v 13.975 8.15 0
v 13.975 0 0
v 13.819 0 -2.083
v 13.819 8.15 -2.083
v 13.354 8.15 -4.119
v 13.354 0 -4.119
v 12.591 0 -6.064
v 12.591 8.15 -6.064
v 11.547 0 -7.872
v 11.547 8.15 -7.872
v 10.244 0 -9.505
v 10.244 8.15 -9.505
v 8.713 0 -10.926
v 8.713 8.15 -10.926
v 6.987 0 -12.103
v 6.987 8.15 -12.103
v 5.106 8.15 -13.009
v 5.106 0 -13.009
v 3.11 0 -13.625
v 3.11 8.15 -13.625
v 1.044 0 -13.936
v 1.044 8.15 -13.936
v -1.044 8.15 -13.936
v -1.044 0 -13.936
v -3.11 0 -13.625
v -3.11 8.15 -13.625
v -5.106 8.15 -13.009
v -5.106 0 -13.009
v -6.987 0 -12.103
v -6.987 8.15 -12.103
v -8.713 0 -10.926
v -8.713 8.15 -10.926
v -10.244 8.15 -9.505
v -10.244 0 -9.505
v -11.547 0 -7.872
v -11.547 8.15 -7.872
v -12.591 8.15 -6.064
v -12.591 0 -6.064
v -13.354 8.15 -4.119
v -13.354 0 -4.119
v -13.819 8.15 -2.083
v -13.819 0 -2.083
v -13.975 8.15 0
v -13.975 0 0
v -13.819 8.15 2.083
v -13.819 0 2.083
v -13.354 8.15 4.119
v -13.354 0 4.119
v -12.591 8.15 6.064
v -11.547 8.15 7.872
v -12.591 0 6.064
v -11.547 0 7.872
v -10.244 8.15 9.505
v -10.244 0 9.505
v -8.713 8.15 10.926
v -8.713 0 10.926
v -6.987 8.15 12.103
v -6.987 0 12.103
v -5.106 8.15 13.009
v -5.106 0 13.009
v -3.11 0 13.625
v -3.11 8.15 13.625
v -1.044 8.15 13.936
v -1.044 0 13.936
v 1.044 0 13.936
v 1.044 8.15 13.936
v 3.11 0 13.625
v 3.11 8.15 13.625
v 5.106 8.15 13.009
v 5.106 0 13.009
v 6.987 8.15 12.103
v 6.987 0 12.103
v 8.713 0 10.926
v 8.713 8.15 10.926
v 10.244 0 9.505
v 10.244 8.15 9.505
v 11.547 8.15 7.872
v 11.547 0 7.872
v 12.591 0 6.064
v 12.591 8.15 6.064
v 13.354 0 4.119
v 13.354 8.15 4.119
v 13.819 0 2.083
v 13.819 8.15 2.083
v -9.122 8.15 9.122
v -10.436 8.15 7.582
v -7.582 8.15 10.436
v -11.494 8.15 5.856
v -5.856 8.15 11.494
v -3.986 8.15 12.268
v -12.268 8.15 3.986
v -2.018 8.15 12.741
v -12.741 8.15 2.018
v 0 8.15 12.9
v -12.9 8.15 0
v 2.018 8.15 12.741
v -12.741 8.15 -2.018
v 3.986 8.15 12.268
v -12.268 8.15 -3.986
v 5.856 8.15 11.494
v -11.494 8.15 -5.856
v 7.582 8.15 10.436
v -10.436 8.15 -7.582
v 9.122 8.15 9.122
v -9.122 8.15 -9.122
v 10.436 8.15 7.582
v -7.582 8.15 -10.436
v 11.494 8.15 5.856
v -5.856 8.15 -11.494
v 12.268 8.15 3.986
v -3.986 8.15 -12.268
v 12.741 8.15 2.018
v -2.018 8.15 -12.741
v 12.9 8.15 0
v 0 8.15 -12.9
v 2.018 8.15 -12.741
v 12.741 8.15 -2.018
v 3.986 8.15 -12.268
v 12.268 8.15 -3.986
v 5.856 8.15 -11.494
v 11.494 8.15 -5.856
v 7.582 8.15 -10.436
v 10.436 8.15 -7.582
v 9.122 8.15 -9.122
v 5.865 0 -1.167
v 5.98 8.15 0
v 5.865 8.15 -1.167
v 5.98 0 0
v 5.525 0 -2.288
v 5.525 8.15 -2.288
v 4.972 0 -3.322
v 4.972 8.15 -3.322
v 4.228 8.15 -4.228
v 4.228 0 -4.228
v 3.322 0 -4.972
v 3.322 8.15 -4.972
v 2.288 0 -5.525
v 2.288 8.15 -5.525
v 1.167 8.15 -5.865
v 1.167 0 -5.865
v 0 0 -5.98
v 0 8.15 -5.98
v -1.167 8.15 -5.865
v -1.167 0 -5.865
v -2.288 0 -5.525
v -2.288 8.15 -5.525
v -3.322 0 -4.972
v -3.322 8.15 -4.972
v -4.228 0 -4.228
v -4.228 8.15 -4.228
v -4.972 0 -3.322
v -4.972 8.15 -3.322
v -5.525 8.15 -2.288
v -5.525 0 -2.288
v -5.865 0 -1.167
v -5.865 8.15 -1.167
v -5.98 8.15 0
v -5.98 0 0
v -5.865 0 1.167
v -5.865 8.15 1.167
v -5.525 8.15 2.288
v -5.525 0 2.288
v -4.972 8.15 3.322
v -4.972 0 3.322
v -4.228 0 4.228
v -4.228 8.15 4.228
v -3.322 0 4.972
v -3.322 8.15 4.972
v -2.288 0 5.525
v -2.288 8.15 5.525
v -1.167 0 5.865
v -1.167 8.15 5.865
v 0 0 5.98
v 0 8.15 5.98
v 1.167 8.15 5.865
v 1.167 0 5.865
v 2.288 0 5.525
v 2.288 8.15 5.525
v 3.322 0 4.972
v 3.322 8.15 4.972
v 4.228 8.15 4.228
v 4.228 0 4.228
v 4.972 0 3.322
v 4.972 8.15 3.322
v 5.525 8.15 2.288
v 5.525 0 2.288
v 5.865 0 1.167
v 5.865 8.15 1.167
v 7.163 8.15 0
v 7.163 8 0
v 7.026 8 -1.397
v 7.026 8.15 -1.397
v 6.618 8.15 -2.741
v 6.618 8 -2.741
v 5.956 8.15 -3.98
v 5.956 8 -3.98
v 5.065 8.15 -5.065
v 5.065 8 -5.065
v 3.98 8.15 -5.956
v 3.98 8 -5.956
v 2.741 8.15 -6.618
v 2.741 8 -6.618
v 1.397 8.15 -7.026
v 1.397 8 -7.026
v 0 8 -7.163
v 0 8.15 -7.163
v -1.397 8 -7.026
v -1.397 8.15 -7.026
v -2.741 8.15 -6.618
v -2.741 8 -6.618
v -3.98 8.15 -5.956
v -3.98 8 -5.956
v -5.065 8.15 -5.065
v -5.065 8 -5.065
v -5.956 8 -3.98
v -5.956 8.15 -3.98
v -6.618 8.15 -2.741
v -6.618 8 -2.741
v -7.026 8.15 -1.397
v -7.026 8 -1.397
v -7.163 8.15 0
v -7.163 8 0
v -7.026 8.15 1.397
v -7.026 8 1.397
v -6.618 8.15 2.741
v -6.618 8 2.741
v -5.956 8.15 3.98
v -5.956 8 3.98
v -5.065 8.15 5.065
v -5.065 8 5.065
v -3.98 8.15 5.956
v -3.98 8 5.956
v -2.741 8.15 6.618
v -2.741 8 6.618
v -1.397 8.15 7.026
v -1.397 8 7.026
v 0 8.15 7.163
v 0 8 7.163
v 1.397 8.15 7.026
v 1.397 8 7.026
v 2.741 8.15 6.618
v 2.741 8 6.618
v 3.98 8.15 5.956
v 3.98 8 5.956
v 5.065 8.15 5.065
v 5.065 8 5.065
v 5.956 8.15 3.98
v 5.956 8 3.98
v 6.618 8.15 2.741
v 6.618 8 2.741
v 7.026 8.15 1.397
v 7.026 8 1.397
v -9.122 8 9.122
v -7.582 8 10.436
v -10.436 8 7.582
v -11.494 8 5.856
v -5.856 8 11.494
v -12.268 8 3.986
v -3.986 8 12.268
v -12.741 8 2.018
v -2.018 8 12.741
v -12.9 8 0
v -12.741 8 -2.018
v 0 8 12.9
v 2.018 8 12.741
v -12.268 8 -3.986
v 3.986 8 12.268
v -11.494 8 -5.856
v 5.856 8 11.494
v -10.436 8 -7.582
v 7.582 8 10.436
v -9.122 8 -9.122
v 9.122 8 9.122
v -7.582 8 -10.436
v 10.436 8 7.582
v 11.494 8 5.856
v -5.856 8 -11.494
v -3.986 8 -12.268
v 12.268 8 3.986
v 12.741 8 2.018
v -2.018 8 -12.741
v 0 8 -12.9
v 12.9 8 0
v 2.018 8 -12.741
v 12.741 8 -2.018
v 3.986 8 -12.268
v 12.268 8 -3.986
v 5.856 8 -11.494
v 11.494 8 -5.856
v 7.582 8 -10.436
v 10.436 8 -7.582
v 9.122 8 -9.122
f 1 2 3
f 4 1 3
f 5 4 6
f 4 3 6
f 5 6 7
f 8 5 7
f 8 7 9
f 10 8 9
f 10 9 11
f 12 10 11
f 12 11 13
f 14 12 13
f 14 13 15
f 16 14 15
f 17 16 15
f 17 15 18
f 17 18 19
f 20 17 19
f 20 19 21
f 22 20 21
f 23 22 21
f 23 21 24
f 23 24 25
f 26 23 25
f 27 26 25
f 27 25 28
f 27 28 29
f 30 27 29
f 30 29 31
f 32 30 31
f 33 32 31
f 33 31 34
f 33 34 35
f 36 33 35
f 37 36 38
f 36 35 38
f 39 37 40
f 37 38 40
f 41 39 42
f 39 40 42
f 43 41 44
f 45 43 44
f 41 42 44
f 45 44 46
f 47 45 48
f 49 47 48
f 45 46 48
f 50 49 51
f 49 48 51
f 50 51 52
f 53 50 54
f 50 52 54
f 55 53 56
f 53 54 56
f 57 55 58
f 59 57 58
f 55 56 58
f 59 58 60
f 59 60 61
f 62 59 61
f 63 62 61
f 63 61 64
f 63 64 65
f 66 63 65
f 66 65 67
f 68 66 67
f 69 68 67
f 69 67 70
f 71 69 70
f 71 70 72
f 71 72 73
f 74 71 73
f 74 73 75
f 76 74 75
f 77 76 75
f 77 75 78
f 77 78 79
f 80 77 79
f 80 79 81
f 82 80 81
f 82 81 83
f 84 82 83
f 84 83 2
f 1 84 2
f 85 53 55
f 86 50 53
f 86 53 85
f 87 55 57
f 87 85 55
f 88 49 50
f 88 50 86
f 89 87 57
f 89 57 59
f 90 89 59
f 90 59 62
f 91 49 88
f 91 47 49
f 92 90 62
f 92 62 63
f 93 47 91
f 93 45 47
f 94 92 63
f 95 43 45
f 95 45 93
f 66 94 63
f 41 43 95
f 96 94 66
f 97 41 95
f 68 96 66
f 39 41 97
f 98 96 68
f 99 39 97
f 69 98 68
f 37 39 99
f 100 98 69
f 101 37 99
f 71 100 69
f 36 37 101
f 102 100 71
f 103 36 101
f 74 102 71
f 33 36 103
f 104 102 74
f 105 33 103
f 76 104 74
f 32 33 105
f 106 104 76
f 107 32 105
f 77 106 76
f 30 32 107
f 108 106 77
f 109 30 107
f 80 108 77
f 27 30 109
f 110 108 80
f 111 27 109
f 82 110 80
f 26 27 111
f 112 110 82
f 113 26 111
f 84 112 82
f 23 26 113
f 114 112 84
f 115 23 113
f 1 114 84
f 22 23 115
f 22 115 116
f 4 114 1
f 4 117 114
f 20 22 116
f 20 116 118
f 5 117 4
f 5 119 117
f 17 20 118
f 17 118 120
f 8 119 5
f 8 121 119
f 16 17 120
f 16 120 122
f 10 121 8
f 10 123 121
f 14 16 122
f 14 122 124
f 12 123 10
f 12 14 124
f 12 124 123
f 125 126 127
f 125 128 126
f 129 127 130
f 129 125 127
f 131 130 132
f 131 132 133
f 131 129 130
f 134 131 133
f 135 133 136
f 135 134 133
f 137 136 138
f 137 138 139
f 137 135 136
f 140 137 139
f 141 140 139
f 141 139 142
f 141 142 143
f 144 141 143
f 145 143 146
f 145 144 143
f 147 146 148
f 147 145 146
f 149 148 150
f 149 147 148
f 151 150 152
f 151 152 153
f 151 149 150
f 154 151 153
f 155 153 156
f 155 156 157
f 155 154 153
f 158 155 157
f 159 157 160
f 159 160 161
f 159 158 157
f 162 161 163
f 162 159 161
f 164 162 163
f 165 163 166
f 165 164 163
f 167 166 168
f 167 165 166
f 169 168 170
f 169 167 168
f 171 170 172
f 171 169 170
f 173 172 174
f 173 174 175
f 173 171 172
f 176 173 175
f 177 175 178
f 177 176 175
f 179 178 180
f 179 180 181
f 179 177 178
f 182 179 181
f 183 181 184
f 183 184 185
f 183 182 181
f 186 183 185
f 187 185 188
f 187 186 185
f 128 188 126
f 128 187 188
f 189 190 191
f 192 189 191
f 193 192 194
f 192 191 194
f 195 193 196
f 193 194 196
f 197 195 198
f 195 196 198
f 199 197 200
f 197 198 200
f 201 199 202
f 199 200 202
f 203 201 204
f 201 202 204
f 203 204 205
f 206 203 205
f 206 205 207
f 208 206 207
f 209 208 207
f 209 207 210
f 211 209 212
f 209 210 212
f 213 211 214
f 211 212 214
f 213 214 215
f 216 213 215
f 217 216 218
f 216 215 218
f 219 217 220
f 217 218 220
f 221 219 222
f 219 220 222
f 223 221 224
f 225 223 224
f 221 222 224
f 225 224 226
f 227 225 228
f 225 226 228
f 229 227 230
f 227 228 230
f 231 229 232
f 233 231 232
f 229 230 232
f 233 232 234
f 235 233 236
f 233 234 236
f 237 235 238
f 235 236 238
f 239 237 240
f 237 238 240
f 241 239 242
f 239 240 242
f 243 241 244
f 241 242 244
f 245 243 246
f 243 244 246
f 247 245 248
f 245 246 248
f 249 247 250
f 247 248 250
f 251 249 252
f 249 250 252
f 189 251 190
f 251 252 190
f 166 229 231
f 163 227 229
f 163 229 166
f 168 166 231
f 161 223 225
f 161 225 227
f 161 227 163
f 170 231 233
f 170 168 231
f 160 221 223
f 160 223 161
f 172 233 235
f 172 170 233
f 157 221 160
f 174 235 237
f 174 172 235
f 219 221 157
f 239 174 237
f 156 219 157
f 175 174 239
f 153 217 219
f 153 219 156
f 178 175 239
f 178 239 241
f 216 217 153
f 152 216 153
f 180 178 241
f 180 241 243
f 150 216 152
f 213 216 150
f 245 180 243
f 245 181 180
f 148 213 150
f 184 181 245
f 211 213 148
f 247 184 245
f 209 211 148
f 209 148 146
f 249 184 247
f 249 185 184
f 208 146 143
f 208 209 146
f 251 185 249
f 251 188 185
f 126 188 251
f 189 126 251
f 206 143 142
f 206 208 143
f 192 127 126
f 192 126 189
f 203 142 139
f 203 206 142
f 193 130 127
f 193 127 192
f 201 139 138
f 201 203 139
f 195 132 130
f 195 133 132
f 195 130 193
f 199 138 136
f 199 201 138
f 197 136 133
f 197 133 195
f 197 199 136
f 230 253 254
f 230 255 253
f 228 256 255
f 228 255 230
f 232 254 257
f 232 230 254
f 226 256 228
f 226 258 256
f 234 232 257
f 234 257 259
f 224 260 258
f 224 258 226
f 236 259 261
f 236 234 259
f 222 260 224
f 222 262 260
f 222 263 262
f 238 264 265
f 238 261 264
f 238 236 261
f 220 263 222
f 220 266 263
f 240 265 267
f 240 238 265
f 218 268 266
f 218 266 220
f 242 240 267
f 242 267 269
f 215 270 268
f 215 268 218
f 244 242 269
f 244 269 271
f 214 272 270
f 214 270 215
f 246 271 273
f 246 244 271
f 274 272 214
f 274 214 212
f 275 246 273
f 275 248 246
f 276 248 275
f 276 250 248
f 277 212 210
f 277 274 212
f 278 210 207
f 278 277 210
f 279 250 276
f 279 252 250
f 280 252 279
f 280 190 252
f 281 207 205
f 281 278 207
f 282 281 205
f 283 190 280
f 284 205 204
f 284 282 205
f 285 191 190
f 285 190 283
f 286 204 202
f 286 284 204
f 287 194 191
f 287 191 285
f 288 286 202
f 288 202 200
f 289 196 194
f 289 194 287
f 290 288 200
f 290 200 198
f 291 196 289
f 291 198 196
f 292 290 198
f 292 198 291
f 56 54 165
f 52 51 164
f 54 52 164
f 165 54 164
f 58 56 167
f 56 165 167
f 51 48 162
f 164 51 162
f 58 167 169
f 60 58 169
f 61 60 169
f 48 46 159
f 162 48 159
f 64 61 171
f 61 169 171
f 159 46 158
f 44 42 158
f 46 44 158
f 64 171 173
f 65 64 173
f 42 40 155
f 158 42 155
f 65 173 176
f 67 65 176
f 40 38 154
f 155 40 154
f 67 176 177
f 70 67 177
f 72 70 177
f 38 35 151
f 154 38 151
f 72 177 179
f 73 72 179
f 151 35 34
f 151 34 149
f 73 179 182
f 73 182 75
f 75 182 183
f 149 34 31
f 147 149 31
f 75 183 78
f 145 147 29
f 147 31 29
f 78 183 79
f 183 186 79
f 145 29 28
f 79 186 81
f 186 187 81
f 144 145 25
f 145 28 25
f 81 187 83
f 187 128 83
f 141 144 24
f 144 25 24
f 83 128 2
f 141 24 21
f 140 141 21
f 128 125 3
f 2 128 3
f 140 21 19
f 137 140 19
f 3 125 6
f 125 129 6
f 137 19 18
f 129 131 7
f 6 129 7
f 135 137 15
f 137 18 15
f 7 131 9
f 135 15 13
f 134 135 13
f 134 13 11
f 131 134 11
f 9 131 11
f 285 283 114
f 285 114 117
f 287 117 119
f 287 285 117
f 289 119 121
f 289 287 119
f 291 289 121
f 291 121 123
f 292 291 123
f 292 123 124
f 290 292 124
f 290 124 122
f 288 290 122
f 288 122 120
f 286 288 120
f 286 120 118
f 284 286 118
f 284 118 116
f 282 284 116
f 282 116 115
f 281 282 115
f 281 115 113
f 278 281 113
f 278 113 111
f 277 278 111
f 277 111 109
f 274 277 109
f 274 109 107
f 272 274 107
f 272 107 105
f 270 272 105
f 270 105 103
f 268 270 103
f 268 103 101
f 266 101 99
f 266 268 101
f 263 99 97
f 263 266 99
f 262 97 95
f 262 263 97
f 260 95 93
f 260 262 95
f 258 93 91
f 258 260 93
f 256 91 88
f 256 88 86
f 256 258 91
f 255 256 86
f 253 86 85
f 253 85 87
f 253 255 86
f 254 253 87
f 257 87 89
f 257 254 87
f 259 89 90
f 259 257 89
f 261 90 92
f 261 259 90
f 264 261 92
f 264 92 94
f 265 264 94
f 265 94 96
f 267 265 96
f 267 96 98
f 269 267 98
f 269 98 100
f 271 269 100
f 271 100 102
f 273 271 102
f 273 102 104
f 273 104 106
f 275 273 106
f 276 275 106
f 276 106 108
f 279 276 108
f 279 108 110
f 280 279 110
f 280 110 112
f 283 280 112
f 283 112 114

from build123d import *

# Parameters (mm, degrees)
CROQUIS1_R              = 13.975
SALIENTE_EXTRUIR1_DEPTH = 8
CROQUIS2_R              = 5.98
CORTAR_EXTRUIR1_DEPTH   = 8
CROQUIS3_R              = 7.163309877
CROQUIS3_R_2            = 5.98
SALIENTE_EXTRUIR3_DEPTH = 0.15
CROQUIS4_R              = 13.975
CROQUIS4_R_2            = 12.899809837
SALIENTE_EXTRUIR4_DEPTH = 8.15


with BuildPart() as part:
    # Croquis1 → Saliente-Extruir1 (new body)
    with BuildSketch(Plane(origin=(0, 0, 0), x_dir=(1, 0, 0), z_dir=(0, 1, 0))):
        Circle(CROQUIS1_R)
    extrude(amount=SALIENTE_EXTRUIR1_DEPTH)

    # Croquis2 → Cortar-Extruir1 (cut)
    with BuildSketch(Plane(origin=(0, 8, 0), x_dir=(1, 0, 0), z_dir=(0, 1, 0))):
        Circle(CROQUIS2_R)
    extrude(amount=-CORTAR_EXTRUIR1_DEPTH, mode=Mode.SUBTRACT)

    # Croquis3 → Saliente-Extruir3 (add)
    with BuildSketch(Plane(origin=(0, 8, 0), x_dir=(1, 0, 0), z_dir=(0, 1, 0))):
        Circle(CROQUIS3_R)
        Circle(CROQUIS3_R_2, mode=Mode.SUBTRACT)
    extrude(amount=SALIENTE_EXTRUIR3_DEPTH)

    # Croquis4 → Saliente-Extruir4 (add)
    with BuildSketch(Plane(origin=(0, 0, 0), x_dir=(1, 0, 0), z_dir=(0, 1, 0))):
        Circle(CROQUIS4_R)
        Circle(CROQUIS4_R_2, mode=Mode.SUBTRACT)
    extrude(amount=SALIENTE_EXTRUIR4_DEPTH)


solid = part.part
